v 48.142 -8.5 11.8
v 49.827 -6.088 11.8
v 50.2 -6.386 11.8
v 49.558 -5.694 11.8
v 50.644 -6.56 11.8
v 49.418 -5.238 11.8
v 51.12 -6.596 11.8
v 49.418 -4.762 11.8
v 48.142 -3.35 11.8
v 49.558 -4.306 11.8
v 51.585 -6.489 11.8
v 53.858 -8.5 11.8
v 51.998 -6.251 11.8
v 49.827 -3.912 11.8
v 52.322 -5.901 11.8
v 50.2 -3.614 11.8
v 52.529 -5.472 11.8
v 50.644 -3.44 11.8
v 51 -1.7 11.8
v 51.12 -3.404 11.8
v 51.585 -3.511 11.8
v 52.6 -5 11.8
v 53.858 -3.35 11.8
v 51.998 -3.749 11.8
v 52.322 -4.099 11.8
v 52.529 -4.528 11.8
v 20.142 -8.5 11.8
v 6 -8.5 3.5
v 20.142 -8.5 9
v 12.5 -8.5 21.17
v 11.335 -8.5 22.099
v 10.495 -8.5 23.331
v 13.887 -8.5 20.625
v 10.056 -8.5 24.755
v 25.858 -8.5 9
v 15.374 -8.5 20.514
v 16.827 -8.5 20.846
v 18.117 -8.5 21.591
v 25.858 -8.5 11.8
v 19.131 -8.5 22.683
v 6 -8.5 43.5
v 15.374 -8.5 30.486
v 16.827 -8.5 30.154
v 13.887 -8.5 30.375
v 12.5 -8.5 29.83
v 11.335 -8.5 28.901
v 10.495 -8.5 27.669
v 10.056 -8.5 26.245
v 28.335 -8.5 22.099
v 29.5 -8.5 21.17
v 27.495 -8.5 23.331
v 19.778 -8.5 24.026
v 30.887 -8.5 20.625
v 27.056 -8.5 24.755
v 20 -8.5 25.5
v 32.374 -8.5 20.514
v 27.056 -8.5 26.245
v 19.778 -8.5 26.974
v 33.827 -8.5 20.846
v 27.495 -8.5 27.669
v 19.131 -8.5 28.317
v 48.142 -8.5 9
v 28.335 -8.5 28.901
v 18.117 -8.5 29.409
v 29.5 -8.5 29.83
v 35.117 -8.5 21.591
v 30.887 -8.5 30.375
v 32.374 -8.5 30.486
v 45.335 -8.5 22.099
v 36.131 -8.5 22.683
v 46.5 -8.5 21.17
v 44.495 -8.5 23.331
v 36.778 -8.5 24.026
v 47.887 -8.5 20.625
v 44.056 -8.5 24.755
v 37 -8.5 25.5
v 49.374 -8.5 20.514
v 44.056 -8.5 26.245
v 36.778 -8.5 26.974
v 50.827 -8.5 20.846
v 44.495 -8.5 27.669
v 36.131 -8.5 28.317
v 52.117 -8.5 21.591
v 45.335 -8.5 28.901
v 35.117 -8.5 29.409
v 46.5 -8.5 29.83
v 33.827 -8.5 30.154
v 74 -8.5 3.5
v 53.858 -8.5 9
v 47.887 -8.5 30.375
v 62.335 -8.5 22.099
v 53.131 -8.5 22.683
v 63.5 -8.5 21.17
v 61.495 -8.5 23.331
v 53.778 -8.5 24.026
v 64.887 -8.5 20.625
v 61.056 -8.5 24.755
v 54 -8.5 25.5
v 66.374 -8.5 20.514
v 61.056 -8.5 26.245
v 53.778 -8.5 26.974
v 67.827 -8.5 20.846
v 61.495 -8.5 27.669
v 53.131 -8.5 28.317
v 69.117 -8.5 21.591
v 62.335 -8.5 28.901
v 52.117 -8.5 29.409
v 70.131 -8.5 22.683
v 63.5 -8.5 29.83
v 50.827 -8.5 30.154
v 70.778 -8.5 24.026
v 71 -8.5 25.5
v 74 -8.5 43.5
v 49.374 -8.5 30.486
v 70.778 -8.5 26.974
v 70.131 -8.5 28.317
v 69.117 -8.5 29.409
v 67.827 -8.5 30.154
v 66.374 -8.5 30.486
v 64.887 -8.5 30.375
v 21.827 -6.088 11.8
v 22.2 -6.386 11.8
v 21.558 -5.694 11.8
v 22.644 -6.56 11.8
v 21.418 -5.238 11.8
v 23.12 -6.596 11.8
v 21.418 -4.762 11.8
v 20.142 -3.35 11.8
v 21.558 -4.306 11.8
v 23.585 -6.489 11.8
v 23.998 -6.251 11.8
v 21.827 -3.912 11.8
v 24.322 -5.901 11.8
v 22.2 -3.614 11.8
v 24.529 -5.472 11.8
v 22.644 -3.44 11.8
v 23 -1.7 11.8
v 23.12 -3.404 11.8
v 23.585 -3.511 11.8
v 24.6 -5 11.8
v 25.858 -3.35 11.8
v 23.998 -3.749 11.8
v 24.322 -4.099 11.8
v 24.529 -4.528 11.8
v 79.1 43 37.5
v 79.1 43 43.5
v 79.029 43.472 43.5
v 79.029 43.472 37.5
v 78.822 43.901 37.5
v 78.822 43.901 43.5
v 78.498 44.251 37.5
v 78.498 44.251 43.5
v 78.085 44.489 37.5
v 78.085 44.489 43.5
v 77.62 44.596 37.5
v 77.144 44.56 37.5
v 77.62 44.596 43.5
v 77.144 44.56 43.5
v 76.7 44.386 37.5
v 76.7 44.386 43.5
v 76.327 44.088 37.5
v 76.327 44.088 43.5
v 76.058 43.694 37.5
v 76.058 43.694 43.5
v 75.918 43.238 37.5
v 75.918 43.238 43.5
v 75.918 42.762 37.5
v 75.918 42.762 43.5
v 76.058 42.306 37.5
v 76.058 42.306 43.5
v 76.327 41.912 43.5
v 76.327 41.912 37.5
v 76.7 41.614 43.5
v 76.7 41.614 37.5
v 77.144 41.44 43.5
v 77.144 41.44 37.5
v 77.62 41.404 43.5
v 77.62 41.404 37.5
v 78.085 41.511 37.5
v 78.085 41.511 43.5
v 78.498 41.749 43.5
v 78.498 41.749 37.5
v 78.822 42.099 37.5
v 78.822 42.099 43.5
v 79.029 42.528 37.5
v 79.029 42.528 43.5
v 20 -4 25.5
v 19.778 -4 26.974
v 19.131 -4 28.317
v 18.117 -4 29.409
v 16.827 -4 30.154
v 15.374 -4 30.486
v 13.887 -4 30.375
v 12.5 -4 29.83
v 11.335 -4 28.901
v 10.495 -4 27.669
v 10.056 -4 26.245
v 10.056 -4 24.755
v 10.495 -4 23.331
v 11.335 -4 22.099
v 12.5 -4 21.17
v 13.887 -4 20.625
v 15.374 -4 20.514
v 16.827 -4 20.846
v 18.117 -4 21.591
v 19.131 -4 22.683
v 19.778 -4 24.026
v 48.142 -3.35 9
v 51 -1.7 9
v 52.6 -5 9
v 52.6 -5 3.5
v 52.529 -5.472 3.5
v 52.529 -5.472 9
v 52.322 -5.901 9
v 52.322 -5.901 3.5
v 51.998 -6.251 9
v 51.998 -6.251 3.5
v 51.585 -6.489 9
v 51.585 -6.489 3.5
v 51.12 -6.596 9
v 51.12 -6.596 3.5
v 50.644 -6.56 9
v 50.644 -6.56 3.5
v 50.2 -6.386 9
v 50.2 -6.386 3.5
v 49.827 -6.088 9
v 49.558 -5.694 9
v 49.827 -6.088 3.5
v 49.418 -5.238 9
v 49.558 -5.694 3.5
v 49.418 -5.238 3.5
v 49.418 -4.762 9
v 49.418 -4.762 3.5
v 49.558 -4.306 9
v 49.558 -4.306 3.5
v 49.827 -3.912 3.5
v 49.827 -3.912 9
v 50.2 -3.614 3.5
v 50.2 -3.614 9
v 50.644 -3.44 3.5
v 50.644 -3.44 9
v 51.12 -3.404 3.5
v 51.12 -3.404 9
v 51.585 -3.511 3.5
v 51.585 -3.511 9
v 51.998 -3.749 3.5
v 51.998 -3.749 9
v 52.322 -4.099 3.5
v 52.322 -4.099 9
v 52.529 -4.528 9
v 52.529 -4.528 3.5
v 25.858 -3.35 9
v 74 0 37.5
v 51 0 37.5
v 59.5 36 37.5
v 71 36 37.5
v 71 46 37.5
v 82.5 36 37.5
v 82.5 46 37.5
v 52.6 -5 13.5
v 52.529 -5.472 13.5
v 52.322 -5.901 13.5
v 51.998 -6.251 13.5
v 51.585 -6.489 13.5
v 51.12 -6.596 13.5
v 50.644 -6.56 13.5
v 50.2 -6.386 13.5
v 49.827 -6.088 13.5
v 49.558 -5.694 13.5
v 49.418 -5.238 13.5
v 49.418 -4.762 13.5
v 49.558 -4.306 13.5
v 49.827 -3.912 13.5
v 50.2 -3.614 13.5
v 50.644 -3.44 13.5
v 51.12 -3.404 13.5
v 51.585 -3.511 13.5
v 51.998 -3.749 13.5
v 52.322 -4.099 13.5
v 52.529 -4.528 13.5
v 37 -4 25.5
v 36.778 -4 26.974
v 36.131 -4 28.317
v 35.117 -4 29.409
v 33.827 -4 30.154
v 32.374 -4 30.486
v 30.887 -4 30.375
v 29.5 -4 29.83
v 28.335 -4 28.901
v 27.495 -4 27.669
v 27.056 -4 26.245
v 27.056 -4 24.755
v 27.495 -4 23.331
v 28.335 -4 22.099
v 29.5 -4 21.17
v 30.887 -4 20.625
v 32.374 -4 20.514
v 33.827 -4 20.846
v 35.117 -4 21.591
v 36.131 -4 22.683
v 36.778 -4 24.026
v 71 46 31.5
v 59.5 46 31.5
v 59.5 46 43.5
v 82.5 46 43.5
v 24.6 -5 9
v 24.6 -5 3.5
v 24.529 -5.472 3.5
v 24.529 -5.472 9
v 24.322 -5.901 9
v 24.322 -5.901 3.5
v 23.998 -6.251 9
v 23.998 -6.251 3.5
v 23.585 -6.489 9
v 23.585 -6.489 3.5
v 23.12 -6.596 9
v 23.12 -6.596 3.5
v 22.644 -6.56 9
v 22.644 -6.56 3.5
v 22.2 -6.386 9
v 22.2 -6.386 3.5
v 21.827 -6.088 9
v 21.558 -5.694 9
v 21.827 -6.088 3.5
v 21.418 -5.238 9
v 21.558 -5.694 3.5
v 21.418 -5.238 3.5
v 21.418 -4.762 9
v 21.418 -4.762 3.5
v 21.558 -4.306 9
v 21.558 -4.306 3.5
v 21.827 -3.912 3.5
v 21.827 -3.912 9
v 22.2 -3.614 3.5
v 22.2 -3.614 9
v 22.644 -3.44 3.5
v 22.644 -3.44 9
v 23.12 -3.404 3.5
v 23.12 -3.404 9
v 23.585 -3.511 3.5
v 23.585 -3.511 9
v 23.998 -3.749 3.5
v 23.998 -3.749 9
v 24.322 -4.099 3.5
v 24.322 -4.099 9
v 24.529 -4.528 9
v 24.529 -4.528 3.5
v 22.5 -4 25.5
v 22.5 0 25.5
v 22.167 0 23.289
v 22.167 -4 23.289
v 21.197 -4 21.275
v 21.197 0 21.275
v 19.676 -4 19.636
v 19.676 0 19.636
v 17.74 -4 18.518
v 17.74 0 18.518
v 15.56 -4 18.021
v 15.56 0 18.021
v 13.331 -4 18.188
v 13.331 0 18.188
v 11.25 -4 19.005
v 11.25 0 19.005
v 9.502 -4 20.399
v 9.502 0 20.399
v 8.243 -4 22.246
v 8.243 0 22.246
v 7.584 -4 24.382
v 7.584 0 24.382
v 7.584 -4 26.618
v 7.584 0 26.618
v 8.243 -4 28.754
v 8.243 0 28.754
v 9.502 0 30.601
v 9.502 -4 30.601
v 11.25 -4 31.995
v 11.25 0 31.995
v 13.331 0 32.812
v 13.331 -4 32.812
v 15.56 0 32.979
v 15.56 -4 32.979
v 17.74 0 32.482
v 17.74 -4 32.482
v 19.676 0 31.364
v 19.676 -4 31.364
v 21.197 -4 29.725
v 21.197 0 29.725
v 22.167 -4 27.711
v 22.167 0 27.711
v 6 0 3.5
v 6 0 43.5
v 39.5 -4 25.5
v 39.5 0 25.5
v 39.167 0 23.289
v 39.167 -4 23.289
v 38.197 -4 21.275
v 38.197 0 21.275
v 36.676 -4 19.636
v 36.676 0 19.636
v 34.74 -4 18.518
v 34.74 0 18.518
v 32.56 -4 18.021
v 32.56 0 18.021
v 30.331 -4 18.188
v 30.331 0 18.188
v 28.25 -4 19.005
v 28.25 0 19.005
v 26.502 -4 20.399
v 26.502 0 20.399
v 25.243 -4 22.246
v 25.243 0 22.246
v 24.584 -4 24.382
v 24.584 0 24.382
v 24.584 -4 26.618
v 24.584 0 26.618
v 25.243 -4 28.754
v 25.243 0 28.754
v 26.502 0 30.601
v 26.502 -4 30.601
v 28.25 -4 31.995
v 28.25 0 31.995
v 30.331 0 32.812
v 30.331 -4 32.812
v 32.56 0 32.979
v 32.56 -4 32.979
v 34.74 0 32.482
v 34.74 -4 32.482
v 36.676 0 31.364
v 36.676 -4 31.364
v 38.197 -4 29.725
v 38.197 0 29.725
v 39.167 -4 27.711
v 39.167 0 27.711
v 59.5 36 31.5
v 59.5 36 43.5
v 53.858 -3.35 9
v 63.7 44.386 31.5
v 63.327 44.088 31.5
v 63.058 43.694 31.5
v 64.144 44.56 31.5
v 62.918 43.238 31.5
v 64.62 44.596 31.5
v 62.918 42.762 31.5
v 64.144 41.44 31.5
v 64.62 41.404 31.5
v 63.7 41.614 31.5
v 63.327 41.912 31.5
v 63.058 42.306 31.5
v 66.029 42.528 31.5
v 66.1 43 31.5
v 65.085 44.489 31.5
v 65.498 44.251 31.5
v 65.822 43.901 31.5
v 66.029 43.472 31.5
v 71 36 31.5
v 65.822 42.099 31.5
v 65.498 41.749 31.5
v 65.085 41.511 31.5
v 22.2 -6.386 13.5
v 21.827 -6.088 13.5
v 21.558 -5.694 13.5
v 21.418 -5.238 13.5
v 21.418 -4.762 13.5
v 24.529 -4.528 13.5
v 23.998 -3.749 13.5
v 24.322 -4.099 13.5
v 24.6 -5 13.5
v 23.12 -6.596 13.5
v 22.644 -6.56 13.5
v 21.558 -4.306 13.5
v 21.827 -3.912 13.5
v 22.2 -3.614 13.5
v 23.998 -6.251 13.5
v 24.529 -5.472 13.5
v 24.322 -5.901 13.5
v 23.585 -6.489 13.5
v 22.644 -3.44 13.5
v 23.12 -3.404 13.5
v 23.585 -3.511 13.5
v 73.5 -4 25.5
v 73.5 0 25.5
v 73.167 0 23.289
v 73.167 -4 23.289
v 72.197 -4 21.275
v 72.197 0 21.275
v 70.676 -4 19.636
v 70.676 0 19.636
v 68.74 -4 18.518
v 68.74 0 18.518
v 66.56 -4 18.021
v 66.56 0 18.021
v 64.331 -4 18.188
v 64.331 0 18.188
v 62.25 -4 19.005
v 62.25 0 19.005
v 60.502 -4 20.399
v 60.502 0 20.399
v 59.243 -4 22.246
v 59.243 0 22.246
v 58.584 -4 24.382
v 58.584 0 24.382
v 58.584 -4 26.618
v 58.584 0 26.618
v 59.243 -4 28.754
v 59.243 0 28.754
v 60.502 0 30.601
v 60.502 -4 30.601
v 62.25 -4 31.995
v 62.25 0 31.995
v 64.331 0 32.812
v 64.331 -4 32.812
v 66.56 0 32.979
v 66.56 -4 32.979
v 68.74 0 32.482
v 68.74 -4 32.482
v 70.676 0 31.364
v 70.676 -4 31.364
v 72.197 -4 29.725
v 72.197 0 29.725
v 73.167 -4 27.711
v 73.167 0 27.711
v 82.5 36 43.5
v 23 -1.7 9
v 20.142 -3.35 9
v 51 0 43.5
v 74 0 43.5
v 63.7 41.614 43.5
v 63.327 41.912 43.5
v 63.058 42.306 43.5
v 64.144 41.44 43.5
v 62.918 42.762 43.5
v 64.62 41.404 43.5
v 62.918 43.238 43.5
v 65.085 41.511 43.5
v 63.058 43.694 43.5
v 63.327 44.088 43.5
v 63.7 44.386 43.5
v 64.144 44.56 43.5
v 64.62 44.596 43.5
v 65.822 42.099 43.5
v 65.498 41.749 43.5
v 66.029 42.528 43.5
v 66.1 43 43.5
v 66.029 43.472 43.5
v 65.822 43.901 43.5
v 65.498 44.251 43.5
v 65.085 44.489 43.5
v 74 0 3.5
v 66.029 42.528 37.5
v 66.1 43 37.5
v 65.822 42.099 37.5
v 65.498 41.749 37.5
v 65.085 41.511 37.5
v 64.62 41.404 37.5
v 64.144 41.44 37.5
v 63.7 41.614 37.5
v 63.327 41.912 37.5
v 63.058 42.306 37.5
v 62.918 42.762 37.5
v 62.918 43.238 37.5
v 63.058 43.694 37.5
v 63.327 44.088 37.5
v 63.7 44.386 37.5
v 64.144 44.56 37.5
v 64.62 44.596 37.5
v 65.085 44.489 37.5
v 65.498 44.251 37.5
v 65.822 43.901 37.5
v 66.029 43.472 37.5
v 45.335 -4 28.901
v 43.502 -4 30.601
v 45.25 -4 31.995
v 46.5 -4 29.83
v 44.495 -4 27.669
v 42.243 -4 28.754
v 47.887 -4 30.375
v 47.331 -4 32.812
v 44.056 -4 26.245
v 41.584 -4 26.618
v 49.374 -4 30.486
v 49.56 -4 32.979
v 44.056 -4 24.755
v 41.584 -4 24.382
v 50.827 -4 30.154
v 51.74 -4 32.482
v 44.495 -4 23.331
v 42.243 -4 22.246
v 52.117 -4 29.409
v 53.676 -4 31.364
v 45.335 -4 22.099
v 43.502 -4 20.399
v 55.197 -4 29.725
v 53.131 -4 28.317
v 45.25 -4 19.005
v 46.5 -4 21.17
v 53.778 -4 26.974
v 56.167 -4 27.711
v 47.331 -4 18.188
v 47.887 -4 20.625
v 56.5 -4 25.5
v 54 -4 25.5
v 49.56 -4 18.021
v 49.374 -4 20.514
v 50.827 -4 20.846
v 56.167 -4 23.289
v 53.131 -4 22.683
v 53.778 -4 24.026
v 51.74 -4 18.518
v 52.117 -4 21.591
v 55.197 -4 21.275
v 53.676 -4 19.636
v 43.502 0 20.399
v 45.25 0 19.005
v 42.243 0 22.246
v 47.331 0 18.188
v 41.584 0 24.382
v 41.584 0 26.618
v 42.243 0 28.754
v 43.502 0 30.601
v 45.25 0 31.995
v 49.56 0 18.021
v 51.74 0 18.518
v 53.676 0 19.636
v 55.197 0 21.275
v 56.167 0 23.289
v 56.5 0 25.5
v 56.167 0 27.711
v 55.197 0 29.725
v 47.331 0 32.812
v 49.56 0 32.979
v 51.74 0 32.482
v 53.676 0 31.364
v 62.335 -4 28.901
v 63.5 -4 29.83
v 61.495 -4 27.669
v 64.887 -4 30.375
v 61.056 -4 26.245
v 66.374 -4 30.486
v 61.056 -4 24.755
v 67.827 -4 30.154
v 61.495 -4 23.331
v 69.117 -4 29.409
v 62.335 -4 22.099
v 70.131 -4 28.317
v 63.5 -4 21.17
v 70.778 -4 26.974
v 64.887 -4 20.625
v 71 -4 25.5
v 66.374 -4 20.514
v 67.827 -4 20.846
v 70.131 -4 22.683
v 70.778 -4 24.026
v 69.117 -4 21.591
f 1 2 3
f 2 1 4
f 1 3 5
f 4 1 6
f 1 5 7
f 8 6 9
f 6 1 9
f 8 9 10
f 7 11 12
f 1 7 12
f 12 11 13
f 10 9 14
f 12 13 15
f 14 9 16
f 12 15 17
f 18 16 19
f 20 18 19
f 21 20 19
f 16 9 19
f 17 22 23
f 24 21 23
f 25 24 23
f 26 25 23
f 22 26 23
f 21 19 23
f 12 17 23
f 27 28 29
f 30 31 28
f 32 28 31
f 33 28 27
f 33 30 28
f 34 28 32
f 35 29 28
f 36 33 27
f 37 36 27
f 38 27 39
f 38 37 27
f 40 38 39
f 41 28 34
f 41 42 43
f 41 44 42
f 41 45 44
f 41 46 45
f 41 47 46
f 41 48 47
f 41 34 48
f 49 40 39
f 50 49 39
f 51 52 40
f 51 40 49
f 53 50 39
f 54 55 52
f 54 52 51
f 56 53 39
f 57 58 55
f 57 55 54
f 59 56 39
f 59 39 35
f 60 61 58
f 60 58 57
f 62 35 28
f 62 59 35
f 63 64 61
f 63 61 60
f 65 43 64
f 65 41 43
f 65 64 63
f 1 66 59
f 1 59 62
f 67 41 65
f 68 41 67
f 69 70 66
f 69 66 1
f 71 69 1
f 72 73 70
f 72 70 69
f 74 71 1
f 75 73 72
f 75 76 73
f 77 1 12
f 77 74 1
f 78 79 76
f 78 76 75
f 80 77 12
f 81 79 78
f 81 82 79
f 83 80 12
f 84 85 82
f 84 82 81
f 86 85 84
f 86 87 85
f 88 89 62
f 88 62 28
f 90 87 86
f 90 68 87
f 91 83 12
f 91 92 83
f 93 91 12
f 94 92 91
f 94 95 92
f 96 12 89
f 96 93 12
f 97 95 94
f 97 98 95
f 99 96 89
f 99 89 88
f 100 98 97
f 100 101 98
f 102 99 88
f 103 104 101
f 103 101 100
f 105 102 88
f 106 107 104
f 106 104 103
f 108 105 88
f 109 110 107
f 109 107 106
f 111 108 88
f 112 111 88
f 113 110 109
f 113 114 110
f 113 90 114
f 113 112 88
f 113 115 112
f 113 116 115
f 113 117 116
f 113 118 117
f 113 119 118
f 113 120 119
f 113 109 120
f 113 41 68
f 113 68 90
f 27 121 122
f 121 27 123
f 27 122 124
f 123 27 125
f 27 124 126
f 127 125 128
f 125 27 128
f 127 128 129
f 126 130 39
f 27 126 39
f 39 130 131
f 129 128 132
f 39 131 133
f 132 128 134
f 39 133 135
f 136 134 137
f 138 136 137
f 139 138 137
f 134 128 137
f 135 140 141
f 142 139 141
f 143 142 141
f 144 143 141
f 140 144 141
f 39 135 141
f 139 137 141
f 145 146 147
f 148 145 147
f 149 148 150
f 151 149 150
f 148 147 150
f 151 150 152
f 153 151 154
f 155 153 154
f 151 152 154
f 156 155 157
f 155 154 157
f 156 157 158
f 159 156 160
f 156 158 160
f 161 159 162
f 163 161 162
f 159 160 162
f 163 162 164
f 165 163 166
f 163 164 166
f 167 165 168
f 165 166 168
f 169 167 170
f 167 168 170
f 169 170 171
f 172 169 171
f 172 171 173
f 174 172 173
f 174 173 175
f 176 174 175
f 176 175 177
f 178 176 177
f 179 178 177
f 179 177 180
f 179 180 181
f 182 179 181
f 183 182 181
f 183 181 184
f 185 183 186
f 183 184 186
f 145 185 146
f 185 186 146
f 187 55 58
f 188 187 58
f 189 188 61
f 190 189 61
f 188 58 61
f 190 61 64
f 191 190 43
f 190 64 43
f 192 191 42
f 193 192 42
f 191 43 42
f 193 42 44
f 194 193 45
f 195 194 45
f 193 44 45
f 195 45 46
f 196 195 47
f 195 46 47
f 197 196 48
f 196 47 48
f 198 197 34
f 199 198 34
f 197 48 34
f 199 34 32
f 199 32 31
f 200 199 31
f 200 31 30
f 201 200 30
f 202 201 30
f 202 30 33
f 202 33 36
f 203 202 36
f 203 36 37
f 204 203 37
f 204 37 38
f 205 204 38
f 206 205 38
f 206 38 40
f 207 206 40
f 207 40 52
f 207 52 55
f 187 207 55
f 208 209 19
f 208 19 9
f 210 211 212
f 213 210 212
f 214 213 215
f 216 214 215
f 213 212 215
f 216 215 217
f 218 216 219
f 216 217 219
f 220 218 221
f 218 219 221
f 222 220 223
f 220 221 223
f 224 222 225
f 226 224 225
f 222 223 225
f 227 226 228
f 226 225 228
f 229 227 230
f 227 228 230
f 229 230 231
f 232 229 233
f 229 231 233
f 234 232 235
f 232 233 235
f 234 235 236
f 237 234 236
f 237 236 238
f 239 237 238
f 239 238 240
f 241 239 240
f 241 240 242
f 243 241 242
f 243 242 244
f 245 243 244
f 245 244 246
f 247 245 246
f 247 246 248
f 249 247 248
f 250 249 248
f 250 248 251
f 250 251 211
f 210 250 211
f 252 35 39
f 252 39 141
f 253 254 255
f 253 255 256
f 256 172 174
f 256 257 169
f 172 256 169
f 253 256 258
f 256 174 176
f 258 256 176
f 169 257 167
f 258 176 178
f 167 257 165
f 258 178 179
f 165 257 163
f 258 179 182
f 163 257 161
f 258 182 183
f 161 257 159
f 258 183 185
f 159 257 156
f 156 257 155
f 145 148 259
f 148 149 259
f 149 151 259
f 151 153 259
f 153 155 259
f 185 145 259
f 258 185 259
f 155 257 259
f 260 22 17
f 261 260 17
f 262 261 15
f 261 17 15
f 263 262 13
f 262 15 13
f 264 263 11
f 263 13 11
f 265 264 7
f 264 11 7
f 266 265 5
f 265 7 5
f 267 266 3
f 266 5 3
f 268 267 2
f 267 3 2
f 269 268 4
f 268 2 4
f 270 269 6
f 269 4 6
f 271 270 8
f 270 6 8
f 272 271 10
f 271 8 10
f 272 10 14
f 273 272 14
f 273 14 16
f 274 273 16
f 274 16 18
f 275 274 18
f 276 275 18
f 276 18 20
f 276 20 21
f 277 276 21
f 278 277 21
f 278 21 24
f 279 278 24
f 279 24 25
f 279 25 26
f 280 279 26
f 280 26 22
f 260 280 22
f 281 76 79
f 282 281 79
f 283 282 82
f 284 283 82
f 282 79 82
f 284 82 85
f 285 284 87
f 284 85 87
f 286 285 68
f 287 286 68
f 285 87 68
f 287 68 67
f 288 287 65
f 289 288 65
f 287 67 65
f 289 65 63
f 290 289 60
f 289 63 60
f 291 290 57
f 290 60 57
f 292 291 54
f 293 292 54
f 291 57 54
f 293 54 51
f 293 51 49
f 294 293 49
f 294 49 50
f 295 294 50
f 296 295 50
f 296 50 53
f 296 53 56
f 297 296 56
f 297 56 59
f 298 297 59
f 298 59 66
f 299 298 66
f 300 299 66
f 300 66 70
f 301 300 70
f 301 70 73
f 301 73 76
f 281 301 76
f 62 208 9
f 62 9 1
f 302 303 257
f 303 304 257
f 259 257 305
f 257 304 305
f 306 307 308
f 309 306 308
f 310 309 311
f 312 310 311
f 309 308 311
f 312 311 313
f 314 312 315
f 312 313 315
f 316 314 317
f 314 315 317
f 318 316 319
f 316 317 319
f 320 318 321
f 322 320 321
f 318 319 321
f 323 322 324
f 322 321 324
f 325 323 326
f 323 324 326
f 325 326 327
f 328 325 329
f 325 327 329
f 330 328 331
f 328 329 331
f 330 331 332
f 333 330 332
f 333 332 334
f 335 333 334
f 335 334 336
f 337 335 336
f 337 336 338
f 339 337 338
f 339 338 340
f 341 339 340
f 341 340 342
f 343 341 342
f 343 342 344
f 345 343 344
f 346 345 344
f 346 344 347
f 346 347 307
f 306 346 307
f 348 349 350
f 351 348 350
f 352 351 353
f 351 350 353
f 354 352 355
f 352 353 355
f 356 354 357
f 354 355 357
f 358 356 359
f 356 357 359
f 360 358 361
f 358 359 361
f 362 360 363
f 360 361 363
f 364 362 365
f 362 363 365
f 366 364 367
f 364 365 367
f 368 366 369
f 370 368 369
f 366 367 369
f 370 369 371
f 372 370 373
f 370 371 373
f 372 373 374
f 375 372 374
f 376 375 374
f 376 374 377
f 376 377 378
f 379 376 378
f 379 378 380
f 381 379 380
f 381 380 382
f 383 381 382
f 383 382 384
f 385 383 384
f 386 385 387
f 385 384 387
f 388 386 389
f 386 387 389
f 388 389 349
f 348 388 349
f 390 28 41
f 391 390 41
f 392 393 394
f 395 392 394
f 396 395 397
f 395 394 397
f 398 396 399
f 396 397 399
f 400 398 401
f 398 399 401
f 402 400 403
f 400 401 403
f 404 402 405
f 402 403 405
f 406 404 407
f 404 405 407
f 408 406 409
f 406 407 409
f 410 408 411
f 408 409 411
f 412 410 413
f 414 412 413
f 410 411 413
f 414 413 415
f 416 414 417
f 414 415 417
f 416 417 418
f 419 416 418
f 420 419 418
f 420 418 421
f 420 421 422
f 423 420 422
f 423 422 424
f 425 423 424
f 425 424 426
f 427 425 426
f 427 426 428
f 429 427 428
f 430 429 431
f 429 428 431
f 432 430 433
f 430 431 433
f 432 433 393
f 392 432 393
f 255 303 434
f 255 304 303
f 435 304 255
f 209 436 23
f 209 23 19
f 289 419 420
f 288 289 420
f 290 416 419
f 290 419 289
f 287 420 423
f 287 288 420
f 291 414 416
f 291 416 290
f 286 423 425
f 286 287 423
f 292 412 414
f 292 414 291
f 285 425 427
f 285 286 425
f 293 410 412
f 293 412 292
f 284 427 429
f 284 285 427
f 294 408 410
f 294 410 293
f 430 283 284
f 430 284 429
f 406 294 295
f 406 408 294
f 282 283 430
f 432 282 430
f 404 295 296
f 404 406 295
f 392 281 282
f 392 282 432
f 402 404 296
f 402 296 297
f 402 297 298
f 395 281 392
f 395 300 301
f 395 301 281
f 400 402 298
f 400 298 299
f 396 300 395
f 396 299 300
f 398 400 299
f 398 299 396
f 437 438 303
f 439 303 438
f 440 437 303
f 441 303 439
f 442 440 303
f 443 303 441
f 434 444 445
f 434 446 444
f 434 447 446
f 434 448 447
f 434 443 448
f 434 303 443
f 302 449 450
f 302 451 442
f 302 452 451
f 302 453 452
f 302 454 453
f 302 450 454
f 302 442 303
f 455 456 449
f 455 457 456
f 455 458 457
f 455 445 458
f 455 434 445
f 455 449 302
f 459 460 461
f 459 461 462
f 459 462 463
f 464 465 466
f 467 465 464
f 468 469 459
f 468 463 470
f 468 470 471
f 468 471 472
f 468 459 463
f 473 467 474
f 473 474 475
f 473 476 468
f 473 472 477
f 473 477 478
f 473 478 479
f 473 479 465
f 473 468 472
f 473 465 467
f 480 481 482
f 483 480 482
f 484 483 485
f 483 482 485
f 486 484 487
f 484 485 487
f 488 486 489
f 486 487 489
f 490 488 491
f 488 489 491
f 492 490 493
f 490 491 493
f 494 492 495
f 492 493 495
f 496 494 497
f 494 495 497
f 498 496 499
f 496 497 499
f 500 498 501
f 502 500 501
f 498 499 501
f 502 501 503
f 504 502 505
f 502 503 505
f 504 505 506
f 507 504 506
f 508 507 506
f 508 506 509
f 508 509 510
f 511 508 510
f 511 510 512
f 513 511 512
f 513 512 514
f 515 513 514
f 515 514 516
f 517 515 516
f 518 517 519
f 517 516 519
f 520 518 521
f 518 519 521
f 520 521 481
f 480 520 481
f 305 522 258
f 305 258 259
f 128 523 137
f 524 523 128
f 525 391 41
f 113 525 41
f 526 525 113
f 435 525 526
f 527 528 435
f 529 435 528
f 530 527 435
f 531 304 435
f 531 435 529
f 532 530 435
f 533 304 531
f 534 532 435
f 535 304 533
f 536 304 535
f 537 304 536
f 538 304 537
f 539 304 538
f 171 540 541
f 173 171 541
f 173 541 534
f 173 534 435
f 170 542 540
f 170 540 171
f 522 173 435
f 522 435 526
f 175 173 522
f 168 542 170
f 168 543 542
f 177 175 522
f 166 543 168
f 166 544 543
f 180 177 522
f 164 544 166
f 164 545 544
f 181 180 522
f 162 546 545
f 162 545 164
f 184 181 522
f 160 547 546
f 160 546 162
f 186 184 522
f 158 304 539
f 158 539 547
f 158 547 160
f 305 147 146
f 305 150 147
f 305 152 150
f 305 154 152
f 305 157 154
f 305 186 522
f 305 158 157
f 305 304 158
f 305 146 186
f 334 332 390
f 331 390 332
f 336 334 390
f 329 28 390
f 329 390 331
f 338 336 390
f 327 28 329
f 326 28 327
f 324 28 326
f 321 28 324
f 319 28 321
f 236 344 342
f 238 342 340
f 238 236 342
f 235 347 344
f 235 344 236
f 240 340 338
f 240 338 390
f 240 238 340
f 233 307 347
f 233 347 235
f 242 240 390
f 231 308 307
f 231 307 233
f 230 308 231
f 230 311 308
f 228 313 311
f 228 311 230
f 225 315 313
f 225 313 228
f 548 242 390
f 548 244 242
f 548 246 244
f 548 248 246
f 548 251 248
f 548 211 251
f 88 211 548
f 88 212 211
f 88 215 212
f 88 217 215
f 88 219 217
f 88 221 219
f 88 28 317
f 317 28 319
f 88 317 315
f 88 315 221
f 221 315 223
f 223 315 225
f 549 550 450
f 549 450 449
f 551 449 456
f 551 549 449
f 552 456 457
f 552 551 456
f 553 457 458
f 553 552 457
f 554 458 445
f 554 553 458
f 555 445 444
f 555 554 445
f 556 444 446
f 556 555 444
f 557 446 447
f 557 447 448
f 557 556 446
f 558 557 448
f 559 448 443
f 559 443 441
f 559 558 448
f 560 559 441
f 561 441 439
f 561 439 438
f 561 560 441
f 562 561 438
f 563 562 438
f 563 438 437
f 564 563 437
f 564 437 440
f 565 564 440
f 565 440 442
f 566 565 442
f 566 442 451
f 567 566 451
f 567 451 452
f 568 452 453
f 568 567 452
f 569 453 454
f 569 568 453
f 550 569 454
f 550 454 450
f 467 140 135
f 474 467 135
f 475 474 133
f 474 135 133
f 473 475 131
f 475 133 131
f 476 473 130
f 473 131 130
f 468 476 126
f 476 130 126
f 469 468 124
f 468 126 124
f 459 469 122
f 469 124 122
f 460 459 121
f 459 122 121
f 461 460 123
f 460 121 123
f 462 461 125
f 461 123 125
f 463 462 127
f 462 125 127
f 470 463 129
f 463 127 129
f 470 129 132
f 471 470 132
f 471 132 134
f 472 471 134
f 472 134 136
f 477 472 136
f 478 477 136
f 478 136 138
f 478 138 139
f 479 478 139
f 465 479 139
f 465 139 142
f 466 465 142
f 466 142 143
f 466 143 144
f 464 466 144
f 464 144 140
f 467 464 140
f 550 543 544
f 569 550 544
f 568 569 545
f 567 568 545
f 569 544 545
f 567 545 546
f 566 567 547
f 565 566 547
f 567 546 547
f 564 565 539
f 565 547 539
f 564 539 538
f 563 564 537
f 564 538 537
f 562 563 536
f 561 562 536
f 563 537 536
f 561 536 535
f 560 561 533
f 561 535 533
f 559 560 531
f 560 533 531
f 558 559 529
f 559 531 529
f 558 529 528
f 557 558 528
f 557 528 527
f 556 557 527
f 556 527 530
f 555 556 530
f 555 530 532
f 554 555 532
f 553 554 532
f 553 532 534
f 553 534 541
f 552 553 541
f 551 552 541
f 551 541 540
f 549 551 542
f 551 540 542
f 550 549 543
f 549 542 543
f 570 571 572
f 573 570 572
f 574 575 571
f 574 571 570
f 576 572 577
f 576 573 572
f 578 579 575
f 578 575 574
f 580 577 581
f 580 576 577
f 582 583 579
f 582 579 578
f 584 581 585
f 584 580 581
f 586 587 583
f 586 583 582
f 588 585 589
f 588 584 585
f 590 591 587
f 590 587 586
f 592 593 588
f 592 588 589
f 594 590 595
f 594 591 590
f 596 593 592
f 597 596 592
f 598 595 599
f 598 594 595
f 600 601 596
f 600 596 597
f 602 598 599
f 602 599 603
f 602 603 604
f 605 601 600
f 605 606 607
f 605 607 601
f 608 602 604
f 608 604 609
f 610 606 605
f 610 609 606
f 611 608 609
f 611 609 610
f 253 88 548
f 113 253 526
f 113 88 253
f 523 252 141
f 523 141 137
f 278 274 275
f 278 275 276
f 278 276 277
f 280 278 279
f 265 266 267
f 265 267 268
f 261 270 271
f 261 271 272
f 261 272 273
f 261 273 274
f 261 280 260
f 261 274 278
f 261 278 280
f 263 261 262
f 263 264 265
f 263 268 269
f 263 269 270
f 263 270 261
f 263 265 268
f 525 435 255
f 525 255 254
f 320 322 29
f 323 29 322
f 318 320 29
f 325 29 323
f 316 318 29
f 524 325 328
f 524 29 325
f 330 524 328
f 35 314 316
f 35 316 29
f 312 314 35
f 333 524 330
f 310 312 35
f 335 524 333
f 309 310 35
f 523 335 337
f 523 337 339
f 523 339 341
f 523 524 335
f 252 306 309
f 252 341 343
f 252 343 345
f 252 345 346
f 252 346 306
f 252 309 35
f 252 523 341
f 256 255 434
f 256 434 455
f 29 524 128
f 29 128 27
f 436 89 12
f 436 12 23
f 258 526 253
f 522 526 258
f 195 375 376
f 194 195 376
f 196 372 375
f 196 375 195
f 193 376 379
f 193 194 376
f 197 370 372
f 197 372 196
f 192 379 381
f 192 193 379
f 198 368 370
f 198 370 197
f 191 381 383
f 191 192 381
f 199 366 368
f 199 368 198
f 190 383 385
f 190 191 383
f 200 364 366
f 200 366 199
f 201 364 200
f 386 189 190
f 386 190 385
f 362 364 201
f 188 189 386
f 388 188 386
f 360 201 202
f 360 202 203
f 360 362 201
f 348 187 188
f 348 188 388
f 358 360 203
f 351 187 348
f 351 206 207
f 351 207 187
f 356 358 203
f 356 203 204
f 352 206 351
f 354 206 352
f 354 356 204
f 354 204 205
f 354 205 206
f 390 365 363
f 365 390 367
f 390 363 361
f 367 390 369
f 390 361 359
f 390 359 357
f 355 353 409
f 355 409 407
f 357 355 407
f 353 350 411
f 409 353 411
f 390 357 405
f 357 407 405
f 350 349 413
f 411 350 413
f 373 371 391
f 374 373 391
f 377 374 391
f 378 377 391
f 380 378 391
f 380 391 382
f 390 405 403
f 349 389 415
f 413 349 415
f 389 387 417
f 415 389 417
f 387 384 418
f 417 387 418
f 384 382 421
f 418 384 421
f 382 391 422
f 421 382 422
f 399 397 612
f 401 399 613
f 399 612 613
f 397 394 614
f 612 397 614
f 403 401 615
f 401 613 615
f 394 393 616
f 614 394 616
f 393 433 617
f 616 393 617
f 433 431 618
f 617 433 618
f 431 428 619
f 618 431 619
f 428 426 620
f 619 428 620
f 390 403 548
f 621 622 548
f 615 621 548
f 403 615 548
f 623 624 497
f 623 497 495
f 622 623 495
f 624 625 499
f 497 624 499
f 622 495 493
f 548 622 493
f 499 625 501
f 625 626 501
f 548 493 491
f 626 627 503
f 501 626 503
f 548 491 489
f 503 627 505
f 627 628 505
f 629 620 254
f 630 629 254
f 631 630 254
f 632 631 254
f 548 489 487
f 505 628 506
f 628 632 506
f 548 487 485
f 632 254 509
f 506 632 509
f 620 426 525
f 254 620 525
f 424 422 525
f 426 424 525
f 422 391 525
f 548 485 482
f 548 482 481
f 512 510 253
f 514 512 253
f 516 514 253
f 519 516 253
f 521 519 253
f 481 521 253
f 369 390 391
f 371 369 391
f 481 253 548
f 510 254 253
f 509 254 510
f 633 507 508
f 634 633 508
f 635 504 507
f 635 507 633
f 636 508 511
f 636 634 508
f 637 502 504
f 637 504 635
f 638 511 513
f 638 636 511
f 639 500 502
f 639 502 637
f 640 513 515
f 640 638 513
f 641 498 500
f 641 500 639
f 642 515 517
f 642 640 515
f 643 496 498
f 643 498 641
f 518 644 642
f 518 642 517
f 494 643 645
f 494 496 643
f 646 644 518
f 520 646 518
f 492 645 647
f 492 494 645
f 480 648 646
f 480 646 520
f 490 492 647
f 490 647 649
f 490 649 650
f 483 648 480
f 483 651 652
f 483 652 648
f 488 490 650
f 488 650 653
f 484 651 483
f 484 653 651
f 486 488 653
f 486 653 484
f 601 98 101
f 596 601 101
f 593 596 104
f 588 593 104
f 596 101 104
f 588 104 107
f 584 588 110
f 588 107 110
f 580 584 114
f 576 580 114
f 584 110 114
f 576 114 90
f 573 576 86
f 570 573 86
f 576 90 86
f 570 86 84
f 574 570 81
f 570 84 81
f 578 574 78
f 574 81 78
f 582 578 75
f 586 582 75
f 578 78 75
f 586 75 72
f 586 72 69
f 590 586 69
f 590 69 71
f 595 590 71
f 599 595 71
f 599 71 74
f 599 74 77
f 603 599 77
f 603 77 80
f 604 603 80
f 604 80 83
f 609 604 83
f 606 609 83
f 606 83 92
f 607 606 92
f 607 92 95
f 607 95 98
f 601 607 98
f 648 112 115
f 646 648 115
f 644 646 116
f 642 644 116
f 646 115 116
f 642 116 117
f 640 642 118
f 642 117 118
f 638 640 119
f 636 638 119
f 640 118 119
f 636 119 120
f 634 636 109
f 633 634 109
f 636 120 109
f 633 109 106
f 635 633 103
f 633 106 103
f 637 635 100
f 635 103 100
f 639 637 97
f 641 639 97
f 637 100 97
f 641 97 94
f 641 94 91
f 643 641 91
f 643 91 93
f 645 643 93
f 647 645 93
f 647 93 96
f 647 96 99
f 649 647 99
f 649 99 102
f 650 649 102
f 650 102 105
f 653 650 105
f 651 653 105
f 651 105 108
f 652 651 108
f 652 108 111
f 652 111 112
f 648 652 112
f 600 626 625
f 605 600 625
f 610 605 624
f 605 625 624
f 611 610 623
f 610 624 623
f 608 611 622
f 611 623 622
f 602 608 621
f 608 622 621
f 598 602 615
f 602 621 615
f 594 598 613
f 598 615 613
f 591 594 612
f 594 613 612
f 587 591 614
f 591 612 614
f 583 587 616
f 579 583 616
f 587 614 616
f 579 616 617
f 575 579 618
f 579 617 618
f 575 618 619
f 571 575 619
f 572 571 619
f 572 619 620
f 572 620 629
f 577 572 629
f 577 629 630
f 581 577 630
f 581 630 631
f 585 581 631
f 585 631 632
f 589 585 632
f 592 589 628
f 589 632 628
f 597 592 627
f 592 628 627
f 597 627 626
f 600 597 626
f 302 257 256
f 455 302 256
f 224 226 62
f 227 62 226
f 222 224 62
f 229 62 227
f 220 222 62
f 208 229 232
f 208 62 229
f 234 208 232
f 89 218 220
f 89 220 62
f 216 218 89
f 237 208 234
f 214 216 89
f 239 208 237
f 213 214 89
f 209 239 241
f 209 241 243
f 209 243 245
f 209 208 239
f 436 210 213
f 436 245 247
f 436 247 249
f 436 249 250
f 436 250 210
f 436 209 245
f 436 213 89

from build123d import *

# Parameters (mm, degrees)
EXTRUDE_DEPTH    = 2.8
EXTRUDE001_DEPTH = 2.8
SKETCH_W         = 68
SKETCH_H         = 40
SKETCH_R         = 5
PAD_DEPTH        = 8.5
SKETCH001_R      = 7.5
POCKET_DEPTH     = 4
SKETCH002_R      = 1.6
POCKET001_DEPTH  = 10
SKETCH003_R      = 1.6
PAD001_DEPTH     = 6
SKETCH004_W      = 11.5
SKETCH004_H      = 10
SKETCH004_R      = 1.6
PAD002_DEPTH     = 6


with BuildPart() as extrude_body:
    # Fusion → Extrude (new body)
    with BuildSketch(Plane.XY):
        Polygon((12.624044, -45.3857), (12.624044, -40.3857), (12.624044, -37.0857), (9.76616, -35.4357), (6.908276, -37.0857), (6.908276, -40.3857), (6.908276, -45.3857), align=None)
    extrude(amount=EXTRUDE_DEPTH)


with BuildPart() as extrude_body_1:
    # Extrude placement: moved
    add(extrude_body.part.moved(Location((13.2338, 33.7357, 9))))


with BuildPart() as extrude001:
    # Fusion001 → Extrude001 (new body)
    with BuildSketch(Plane.XY):
        Polygon((12.624044, -45.3857), (12.624044, -40.3857), (12.624044, -37.0857), (9.76616, -35.4357), (6.908276, -37.0857), (6.908276, -40.3857), (6.908276, -45.3857), align=None)
    extrude(amount=EXTRUDE001_DEPTH)


with BuildPart() as extrude001_1:
    # Extrude001 placement: moved
    add(extrude001.part.moved(Location((41.2338, 33.7357, 9))))


with BuildPart() as pad002:
    # Sketch → Pad (new body)
    with BuildSketch(Plane.XZ.offset(8.5)):
        with Locations((40, 23.5)):
            Rectangle(SKETCH_W, SKETCH_H)
        with Locations((15, 25.5)):
            Circle(SKETCH_R, mode=Mode.SUBTRACT)
        with Locations((32, 25.5)):
            Circle(SKETCH_R, mode=Mode.SUBTRACT)
        with Locations((49, 25.5)):
            Circle(SKETCH_R, mode=Mode.SUBTRACT)
        with Locations((66, 25.5)):
            Circle(SKETCH_R, mode=Mode.SUBTRACT)
    extrude(amount=-PAD_DEPTH)

    # Sketch001 → Pocket (cut)
    with BuildSketch(Plane(origin=(0, 0, 0), x_dir=(1, 0, 0), z_dir=(0, 1, 0))):
        with Locations((15, -25.5)):
            Circle(SKETCH001_R)
        with Locations((32, -25.5)):
            Circle(SKETCH001_R)
        with Locations((49, -25.5)):
            Circle(SKETCH001_R)
        with Locations((66, -25.5)):
            Circle(SKETCH001_R)
    extrude(amount=-POCKET_DEPTH, mode=Mode.SUBTRACT)

    # Sketch002 → Pocket001 (cut)
    with BuildSketch(Plane(origin=(0, -8.5, 3.5), x_dir=(1, 0, 0), z_dir=(0, 0, -1))):
        with Locations((51, -3.5)):
            Circle(SKETCH002_R)
        with Locations((23, -3.5)):
            Circle(SKETCH002_R)
    extrude(amount=-POCKET001_DEPTH, mode=Mode.SUBTRACT)

    # Cut: cut Extrude001
    add(extrude001_1.part, mode=Mode.SUBTRACT)

    # Cut001: cut Extrude body
    add(extrude_body_1.part, mode=Mode.SUBTRACT)

    # Sketch003 → Pad001 (new body)
    with BuildSketch(Plane.XY.offset(43.5)):
        Polygon((74, 0), (82.5, 36), (82.5, 46), (59.5, 46), (59.5, 36), (51, 0), align=None)
        with Locations((64.5, 43)):
            Circle(SKETCH003_R, mode=Mode.SUBTRACT)
        with Locations((77.5, 43)):
            Circle(SKETCH003_R, mode=Mode.SUBTRACT)
    extrude(amount=-PAD001_DEPTH)

    # Sketch004 → Pad002 (new body)
    with BuildSketch(Plane(origin=(0, 0, 37.5), x_dir=(1, 0, 0), z_dir=(0, 0, -1))):
        with Locations((65.25, -41)):
            Rectangle(SKETCH004_W, SKETCH004_H)
        with Locations((64.5, -43)):
            Circle(SKETCH004_R, mode=Mode.SUBTRACT)
    extrude(amount=PAD002_DEPTH)


solid = pad002.part
